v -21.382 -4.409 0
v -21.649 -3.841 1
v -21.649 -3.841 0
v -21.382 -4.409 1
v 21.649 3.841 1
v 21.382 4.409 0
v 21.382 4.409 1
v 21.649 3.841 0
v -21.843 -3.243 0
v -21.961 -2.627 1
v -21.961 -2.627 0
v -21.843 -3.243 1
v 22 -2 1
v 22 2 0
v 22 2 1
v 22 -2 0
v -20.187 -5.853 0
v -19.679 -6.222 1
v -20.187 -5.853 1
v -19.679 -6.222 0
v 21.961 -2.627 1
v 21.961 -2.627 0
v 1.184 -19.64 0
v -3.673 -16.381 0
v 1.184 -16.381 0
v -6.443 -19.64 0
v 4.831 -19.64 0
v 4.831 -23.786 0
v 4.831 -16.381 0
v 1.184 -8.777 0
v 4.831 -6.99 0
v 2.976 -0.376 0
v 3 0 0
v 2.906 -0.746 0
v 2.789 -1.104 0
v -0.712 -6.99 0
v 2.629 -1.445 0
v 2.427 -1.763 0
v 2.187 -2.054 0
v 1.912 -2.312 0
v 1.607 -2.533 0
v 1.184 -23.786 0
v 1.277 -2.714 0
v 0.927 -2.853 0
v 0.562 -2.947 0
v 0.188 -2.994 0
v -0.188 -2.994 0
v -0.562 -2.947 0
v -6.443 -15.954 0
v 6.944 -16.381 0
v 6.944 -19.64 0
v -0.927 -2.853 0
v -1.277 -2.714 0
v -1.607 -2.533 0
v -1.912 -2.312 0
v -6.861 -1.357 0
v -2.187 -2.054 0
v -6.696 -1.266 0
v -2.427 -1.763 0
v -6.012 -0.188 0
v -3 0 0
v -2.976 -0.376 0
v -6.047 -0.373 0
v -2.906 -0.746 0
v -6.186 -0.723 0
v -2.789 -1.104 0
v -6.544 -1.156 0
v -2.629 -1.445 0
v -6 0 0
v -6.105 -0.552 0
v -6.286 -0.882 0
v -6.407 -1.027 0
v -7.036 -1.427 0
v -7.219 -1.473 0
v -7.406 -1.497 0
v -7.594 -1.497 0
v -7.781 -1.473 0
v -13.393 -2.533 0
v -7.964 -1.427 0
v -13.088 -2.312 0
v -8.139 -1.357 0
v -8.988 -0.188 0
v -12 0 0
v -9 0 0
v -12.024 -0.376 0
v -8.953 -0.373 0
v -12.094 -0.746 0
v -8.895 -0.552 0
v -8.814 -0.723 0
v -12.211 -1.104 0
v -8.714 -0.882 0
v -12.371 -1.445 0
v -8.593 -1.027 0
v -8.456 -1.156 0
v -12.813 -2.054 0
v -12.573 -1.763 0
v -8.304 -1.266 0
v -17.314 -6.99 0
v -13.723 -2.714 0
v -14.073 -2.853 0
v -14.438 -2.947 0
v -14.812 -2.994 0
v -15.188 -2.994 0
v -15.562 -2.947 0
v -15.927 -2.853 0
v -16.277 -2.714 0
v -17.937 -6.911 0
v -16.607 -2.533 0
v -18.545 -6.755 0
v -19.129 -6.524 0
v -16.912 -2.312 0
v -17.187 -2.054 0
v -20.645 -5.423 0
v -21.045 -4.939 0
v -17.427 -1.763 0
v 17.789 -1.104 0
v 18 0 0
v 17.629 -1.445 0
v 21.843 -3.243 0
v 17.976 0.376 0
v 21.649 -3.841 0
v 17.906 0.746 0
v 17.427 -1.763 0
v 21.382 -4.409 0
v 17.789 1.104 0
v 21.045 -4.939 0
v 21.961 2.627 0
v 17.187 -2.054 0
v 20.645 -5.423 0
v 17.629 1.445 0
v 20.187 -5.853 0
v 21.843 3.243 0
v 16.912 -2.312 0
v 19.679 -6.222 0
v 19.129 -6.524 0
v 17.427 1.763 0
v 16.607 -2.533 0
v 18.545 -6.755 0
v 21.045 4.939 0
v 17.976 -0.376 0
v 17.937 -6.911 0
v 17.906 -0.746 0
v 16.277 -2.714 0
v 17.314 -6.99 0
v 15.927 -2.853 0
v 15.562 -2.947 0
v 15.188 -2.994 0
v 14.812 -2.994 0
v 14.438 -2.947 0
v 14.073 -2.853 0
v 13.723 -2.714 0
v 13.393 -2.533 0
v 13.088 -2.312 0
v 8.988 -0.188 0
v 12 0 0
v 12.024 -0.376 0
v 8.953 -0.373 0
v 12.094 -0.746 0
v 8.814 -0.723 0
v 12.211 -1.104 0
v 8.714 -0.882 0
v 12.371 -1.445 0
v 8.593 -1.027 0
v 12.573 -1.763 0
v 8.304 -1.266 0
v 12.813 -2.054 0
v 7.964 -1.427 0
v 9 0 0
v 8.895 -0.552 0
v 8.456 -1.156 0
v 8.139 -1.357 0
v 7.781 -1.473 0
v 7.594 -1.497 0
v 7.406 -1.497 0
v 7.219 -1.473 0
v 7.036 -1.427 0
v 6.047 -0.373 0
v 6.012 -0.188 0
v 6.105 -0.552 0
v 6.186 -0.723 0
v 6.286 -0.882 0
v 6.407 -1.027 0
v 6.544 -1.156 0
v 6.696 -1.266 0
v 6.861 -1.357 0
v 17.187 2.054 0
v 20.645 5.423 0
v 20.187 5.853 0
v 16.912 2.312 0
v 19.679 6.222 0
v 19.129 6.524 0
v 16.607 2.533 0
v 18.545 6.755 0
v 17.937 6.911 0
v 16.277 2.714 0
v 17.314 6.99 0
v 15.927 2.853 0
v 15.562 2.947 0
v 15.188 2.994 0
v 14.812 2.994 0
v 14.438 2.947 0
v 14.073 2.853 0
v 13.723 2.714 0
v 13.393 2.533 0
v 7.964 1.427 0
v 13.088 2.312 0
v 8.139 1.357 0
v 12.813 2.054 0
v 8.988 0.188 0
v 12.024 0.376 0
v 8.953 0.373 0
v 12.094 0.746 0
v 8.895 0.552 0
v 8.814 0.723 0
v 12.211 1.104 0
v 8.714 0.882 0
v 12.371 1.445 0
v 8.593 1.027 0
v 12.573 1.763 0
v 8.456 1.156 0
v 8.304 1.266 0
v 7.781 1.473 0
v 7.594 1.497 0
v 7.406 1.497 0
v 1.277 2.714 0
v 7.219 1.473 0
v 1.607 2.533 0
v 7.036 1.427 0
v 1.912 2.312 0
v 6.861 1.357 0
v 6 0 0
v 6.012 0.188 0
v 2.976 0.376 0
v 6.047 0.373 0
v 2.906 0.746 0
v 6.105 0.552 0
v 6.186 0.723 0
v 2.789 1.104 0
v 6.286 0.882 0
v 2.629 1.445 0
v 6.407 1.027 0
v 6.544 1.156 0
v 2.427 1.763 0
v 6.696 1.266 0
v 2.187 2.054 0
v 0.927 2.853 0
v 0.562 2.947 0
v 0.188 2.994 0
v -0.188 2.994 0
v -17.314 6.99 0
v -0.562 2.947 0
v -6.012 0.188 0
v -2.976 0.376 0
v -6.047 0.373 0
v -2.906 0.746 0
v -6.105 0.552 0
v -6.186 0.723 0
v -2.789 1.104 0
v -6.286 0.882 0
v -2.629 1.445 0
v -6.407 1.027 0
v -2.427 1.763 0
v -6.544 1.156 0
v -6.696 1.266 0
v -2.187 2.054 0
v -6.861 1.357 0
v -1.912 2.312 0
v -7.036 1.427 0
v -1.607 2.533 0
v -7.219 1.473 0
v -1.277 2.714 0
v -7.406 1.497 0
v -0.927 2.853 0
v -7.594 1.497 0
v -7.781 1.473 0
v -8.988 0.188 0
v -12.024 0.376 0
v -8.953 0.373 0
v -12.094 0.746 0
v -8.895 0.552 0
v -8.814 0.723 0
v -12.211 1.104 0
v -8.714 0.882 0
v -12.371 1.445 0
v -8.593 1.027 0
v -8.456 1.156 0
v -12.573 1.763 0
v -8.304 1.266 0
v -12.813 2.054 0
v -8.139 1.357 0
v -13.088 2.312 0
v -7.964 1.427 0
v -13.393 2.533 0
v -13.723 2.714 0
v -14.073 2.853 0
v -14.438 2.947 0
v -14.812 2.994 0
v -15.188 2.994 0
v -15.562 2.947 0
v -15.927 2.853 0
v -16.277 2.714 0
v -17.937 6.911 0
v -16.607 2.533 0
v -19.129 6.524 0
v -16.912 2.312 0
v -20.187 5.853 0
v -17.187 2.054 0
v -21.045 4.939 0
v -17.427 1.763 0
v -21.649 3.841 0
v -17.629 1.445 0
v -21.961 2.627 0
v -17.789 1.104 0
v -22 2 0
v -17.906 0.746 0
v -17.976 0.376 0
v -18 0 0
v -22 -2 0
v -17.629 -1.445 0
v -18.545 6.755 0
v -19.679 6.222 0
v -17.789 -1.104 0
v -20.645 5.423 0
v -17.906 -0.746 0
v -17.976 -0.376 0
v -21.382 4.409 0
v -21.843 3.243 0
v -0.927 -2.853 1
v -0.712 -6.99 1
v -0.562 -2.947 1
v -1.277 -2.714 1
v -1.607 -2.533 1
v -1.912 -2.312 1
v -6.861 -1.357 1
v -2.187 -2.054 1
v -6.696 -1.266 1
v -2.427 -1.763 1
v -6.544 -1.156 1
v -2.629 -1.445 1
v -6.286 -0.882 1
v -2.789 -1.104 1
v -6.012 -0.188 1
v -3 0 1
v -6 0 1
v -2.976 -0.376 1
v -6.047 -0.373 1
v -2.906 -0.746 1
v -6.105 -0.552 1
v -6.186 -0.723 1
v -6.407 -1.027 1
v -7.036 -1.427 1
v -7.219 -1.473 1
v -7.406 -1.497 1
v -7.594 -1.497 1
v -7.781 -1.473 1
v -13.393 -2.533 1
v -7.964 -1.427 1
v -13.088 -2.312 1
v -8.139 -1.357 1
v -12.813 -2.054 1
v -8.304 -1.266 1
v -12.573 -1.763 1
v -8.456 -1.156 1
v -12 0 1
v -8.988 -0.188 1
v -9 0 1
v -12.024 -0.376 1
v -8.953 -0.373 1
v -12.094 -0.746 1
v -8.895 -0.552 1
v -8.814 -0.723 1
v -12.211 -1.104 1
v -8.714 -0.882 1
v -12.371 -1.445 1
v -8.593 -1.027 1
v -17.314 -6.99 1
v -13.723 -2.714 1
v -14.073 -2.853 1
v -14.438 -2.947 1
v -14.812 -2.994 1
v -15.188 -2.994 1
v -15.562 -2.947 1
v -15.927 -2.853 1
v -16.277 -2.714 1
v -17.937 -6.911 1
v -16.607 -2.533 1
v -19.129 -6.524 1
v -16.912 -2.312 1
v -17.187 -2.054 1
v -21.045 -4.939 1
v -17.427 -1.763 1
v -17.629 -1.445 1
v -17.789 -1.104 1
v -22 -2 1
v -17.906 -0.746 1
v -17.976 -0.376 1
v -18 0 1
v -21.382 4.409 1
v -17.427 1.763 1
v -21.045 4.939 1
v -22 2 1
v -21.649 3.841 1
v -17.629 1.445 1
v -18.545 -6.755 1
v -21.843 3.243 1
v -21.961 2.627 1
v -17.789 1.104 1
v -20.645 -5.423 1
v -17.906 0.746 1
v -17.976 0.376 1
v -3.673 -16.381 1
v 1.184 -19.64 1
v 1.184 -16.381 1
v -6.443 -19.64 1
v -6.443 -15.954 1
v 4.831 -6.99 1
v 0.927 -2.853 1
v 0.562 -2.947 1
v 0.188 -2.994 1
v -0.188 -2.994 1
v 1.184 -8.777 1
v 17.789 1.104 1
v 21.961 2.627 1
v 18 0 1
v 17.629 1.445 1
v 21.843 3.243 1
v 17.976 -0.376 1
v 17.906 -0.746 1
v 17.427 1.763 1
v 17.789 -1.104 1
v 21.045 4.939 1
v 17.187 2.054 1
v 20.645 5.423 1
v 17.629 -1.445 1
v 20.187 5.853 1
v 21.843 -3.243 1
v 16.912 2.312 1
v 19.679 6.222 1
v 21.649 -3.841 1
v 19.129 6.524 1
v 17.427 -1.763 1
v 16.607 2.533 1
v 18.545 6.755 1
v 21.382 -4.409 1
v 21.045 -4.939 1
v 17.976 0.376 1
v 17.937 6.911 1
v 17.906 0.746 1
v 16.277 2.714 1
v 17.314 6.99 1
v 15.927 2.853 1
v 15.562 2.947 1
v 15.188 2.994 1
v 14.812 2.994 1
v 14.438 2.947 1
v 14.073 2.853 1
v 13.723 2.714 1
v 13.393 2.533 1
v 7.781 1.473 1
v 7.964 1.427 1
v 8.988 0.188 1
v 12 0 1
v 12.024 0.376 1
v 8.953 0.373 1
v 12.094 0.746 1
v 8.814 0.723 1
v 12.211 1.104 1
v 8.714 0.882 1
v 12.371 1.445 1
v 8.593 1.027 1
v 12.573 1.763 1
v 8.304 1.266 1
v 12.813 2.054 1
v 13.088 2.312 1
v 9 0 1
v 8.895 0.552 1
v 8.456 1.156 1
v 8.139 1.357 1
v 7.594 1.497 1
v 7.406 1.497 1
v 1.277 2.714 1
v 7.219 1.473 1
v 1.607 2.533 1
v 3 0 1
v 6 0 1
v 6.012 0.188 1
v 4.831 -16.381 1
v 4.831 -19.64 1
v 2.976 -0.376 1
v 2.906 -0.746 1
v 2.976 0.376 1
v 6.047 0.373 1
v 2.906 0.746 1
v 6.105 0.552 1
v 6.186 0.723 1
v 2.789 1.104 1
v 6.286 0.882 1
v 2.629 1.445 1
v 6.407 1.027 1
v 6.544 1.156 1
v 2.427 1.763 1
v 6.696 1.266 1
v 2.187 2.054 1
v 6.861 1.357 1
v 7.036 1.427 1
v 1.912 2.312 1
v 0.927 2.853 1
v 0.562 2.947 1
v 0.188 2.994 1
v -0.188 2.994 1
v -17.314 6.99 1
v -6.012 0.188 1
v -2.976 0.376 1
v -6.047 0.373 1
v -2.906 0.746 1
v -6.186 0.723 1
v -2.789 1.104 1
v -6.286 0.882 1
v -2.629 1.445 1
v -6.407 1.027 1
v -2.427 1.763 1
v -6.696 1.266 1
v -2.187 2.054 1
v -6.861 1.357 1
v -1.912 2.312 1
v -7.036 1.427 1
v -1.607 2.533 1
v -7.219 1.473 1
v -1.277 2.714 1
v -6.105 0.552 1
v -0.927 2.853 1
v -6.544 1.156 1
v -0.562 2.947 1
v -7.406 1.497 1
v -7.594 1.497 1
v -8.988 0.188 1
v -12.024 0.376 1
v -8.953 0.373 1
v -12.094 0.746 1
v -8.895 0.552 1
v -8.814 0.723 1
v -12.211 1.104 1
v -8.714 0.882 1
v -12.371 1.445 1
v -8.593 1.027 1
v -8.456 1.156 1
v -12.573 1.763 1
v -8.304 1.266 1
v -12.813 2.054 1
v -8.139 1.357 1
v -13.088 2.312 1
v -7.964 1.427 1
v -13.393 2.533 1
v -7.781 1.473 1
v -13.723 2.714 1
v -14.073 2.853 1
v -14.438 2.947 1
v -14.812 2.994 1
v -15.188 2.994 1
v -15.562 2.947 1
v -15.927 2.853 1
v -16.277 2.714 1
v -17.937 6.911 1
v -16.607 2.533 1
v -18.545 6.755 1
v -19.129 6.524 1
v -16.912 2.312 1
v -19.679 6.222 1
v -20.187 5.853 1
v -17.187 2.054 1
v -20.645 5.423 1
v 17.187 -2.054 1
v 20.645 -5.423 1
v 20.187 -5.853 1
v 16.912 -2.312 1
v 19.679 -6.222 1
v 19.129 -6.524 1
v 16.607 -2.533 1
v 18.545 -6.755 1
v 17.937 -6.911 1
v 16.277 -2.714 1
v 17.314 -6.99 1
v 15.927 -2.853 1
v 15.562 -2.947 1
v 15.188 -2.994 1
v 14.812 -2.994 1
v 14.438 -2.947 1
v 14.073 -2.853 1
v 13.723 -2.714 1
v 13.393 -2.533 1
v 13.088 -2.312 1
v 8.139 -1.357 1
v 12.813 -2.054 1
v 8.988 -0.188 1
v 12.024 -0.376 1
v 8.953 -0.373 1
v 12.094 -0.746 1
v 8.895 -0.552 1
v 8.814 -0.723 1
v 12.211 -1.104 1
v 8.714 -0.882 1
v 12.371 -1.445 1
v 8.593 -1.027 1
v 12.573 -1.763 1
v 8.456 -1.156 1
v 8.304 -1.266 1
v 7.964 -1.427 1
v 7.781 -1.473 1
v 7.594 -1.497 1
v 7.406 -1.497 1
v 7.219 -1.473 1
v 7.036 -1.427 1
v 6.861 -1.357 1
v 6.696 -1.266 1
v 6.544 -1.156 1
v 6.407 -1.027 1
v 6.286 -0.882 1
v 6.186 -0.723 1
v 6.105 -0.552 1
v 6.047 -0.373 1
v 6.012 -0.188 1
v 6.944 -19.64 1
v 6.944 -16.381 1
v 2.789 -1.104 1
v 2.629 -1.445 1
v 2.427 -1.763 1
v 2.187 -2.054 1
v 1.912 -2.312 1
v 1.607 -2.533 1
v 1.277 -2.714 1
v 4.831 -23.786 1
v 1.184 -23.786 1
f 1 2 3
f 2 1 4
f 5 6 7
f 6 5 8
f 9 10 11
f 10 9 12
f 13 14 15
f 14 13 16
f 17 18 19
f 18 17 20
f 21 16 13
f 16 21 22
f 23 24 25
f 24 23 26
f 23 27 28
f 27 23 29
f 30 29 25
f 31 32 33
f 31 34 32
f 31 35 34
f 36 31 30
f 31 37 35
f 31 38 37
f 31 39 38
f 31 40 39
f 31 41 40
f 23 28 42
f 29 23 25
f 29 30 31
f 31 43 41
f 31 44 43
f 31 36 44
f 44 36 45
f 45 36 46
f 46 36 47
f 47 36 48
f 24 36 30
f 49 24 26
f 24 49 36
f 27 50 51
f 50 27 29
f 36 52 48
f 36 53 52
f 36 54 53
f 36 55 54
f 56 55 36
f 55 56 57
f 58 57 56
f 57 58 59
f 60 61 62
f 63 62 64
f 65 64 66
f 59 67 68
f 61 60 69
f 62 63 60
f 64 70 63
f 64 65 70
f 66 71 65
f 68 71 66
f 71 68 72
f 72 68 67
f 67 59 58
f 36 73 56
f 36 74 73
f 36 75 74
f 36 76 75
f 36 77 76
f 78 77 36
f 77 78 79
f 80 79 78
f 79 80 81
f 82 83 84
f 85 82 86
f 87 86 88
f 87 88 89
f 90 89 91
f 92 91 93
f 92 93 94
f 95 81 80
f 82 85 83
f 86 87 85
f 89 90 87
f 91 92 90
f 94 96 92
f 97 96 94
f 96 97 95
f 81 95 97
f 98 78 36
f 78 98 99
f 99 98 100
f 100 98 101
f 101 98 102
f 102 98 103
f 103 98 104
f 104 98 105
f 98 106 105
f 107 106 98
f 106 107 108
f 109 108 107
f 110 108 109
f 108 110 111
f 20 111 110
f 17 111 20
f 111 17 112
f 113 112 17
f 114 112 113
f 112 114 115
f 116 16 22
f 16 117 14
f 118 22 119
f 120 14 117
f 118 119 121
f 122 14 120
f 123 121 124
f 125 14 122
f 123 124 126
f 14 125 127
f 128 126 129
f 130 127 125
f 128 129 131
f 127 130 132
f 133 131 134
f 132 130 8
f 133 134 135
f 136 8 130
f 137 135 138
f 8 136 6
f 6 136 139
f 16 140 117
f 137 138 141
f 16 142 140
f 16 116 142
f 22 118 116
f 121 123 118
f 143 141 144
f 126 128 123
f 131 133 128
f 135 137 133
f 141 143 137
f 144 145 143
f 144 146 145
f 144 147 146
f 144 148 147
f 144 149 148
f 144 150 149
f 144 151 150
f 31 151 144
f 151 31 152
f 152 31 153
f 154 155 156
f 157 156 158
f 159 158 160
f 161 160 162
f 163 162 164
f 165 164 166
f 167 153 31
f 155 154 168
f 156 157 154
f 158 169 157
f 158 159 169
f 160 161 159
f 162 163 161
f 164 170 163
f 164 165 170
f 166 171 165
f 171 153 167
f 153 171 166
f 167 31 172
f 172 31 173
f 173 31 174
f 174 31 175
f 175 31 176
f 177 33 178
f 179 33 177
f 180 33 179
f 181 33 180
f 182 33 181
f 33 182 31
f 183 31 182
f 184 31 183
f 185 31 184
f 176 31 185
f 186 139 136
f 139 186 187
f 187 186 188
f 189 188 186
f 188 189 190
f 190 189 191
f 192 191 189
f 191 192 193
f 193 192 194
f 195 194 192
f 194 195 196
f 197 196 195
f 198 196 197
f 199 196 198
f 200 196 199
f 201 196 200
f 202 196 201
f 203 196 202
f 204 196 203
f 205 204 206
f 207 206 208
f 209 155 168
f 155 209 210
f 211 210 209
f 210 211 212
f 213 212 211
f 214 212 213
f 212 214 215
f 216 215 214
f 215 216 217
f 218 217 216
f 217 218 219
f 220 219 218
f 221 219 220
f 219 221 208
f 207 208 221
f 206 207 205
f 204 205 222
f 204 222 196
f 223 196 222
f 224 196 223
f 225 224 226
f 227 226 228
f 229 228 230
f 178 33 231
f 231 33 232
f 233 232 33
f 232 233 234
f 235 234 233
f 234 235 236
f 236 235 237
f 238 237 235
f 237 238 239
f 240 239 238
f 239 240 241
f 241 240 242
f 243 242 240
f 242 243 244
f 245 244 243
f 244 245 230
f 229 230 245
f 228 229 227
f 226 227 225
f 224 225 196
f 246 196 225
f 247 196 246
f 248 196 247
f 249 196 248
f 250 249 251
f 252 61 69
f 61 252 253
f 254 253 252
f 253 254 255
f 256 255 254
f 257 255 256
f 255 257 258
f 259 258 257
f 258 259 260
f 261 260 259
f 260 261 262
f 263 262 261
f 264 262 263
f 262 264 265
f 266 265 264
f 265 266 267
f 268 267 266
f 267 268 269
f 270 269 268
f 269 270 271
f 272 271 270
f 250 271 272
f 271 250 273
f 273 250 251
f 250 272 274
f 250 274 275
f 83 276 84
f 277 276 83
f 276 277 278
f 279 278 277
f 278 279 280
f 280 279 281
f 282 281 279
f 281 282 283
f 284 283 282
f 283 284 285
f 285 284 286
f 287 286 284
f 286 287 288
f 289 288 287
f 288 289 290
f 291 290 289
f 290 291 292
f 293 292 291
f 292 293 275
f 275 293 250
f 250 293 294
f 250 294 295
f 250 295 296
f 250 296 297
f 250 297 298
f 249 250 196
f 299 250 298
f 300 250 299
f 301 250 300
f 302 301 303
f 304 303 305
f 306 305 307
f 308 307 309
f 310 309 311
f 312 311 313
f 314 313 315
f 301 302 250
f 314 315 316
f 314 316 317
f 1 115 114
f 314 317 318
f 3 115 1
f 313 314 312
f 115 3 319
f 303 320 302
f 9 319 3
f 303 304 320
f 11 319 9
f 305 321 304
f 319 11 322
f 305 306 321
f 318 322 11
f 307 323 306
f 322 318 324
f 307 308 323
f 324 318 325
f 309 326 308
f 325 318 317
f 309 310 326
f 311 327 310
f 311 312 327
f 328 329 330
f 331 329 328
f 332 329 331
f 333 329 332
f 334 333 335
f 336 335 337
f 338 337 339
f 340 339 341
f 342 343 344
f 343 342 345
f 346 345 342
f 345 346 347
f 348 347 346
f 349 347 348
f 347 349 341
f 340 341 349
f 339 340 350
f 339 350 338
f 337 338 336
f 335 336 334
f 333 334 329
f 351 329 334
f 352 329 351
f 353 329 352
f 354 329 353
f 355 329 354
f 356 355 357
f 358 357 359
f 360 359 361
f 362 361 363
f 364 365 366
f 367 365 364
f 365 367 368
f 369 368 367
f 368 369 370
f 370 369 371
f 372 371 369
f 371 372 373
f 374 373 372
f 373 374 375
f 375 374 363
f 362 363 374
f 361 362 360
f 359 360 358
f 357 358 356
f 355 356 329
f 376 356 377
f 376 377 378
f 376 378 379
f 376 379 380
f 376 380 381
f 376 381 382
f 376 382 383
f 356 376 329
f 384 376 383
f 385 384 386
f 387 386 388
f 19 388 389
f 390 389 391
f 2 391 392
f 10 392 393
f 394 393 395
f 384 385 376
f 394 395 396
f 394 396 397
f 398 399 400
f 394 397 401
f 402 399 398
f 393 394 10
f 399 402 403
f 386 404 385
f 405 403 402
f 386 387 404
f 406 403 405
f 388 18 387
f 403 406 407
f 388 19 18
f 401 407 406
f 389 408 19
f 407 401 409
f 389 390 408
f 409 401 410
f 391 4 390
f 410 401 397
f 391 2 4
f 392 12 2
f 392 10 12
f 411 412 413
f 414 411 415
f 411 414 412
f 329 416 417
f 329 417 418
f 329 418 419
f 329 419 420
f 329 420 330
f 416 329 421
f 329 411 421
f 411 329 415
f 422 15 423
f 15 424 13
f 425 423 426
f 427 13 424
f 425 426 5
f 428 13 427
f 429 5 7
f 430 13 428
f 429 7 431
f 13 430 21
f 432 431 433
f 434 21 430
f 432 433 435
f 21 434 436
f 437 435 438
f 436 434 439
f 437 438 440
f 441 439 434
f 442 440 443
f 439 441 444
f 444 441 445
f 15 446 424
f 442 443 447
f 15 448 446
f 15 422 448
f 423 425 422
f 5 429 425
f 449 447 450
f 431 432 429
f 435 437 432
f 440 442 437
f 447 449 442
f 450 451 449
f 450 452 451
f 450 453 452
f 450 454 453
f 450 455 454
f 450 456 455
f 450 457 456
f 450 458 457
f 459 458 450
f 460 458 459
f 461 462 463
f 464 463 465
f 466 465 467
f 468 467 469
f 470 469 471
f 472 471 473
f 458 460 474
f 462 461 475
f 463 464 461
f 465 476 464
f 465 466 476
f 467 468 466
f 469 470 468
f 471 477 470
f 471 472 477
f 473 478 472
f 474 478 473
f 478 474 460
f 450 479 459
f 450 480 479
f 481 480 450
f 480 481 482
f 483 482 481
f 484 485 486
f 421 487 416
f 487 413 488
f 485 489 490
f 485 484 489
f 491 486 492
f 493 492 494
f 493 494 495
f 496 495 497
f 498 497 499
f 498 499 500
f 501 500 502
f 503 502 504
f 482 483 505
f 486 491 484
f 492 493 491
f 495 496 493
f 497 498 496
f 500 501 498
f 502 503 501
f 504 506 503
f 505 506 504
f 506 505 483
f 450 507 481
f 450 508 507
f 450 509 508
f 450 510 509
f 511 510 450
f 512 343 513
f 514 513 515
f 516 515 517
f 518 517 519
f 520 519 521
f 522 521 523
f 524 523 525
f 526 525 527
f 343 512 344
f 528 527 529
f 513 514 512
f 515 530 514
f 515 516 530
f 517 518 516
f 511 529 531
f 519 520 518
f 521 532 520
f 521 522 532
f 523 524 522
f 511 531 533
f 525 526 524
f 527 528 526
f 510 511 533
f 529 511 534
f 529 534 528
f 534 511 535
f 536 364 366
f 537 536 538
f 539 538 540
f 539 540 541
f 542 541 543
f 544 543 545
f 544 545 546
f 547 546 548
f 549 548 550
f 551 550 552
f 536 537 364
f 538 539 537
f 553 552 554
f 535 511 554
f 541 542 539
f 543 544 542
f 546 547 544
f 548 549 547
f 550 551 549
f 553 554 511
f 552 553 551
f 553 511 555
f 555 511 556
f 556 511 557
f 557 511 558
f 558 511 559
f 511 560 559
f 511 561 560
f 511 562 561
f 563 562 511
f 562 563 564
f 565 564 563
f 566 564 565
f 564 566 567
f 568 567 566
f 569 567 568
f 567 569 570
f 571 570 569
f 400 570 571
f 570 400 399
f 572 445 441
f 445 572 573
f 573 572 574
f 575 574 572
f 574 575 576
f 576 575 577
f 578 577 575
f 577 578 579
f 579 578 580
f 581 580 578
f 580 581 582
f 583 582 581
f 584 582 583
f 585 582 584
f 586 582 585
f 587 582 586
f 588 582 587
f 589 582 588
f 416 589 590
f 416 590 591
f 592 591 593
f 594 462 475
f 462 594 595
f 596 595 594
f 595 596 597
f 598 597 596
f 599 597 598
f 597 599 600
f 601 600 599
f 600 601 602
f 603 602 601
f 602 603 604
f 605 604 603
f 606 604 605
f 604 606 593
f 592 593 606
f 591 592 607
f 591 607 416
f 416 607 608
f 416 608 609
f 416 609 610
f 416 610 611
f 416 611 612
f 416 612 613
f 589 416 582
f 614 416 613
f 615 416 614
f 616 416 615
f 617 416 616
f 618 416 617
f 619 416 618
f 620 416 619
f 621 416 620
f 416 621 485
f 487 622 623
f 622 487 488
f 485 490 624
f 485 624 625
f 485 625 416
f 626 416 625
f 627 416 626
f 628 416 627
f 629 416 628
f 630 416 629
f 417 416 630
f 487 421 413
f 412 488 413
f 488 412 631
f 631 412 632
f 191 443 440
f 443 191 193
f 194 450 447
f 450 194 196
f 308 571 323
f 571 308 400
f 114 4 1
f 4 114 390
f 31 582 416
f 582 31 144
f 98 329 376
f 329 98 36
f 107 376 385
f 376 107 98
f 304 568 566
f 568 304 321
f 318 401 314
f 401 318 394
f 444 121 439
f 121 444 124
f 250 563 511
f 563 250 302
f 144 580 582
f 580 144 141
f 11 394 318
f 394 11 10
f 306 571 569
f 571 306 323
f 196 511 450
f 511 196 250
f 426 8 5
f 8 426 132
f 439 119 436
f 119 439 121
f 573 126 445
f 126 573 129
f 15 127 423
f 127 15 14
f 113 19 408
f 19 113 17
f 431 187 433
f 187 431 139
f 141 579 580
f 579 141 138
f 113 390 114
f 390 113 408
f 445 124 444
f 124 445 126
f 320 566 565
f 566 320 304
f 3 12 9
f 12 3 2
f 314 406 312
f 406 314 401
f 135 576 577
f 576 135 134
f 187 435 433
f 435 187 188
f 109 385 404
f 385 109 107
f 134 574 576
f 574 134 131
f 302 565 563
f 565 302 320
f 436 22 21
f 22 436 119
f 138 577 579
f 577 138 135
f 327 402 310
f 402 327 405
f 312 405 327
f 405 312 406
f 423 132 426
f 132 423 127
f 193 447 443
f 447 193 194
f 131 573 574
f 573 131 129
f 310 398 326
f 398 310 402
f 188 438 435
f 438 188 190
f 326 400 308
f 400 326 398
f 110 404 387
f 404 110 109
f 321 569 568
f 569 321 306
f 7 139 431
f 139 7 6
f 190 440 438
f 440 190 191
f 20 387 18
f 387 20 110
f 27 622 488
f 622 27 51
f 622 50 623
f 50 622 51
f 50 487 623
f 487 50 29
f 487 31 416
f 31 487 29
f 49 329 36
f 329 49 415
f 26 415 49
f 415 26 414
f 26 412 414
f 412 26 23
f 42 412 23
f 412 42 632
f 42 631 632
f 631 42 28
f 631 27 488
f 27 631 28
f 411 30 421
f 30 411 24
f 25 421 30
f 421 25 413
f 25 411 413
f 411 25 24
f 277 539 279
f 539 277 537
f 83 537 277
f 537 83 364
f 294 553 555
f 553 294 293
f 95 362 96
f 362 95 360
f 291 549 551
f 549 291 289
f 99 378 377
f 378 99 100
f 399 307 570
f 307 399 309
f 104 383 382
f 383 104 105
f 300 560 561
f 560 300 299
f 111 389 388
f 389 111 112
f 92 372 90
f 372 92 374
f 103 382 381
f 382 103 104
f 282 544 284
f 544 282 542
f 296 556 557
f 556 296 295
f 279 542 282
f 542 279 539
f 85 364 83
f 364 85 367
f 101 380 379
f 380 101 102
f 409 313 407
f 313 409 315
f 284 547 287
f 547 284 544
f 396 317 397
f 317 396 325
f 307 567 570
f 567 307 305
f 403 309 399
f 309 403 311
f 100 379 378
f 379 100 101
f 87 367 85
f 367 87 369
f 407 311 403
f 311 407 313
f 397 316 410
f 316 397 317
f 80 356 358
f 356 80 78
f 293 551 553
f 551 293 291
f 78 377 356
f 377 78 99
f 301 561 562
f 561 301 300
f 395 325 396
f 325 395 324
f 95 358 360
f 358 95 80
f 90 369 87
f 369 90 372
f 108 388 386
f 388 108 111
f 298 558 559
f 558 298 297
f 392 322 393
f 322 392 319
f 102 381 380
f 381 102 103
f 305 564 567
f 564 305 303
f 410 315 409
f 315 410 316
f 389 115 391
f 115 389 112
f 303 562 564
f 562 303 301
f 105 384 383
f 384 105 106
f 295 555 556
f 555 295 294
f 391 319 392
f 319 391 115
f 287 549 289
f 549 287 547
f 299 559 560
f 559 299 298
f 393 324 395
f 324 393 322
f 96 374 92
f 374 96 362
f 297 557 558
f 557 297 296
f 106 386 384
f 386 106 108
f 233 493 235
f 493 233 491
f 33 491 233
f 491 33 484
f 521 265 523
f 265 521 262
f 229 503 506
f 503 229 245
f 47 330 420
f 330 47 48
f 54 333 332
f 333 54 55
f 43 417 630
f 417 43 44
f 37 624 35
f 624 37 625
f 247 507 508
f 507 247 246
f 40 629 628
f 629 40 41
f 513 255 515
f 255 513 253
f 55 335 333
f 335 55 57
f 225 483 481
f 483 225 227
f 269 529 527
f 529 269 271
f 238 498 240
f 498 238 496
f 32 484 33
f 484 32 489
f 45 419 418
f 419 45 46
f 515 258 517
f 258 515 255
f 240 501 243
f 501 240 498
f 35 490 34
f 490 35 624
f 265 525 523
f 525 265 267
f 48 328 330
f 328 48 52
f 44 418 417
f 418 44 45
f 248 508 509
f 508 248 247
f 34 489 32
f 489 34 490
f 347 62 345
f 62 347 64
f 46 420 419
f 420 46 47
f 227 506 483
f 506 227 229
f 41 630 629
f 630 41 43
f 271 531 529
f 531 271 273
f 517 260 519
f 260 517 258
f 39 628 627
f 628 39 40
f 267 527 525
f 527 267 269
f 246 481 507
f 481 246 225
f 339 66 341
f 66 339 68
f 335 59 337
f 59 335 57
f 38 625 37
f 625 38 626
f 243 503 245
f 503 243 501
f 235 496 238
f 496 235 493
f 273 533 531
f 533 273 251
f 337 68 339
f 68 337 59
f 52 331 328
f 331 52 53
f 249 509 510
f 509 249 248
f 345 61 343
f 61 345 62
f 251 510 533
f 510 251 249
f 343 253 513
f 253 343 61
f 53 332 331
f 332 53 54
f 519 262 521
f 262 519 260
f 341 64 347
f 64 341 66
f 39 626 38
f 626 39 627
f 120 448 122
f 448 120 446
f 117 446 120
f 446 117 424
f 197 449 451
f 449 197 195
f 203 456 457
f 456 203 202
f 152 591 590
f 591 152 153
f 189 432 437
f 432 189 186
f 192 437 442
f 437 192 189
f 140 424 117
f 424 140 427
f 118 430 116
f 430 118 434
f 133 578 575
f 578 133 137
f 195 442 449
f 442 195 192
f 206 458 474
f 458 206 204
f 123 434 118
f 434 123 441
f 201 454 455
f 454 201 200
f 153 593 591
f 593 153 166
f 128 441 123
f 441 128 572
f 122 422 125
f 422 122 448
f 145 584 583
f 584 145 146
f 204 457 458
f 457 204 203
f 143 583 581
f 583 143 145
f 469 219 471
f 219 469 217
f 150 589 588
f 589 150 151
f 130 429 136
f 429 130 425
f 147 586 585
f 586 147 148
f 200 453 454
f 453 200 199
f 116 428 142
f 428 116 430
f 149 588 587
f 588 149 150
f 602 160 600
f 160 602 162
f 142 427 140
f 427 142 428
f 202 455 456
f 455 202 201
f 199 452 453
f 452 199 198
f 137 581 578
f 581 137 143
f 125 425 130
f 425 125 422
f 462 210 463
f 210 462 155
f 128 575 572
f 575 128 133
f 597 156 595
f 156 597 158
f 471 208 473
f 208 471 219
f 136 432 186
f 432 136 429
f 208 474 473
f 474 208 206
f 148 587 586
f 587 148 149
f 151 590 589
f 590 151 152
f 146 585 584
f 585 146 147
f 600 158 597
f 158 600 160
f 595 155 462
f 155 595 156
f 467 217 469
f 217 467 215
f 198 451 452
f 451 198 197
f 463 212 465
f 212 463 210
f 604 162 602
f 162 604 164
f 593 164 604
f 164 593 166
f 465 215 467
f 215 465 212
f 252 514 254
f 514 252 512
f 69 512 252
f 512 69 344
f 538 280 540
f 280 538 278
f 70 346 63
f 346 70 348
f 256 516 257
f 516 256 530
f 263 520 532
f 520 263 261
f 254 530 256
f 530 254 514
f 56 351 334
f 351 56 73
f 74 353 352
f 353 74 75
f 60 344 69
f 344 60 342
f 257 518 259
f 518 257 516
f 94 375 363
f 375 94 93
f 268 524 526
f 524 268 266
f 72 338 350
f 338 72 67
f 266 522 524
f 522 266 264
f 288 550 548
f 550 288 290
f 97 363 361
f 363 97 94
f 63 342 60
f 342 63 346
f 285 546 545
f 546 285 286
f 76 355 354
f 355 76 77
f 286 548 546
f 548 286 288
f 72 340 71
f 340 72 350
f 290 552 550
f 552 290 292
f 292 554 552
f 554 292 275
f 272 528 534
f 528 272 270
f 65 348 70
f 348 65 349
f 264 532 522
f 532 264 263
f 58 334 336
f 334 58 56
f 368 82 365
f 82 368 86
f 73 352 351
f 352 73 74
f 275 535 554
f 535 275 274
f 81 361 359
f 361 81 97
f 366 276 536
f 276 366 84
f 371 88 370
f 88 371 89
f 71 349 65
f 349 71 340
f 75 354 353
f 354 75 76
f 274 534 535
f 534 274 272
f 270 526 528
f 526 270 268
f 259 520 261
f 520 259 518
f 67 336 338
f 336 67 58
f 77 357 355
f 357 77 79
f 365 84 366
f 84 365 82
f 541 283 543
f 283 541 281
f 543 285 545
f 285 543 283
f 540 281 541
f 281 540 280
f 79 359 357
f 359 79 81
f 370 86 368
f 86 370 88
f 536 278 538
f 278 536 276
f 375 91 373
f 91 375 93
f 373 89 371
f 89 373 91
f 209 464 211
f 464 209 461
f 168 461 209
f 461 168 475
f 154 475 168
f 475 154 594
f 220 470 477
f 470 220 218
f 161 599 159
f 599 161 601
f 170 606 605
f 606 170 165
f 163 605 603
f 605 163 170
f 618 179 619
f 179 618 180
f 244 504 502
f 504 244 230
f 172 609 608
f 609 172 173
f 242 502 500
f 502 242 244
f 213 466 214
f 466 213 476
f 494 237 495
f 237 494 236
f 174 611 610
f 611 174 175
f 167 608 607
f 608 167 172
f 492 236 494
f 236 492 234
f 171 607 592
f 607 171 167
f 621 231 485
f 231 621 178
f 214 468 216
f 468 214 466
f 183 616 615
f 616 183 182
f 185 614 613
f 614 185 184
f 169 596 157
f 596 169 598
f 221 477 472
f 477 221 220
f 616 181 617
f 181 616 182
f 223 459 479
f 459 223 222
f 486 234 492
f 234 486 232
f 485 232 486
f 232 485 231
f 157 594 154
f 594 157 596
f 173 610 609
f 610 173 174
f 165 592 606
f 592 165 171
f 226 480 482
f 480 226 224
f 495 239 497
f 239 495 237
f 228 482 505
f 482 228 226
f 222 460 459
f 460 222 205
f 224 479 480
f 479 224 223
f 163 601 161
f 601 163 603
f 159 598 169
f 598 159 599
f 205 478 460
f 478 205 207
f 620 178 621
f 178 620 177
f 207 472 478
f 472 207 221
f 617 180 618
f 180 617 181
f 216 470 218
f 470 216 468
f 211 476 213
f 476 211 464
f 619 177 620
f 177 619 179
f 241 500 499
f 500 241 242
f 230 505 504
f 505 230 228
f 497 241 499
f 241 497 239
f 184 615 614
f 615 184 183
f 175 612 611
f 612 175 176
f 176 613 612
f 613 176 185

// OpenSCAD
$fn = 50;


difference() {
	union() {
		hull() {
			translate(v = [-17.0000000000, 2.0000000000, 0]) {
				cylinder(h = 1, r = 5);
			}
			translate(v = [17.0000000000, 2.0000000000, 0]) {
				cylinder(h = 1, r = 5);
			}
			translate(v = [-17.0000000000, -2.0000000000, 0]) {
				cylinder(h = 1, r = 5);
			}
			translate(v = [17.0000000000, -2.0000000000, 0]) {
				cylinder(h = 1, r = 5);
			}
		}
		translate(v = [0, -5, 0]) {
			linear_extrude(height = 1) {
				text(font = "DejaVu Sans Mono:style=Bold", halign = "center", size = 19.0000000000, text = "4", valign = "top");
			}
		}
	}
	union() {
		translate(v = [-15.0000000000, 0.0000000000, 0]) {
			translate(v = [0, 0, -100]) {
				cylinder(h = 200, r = 3.0000000000);
			}
		}
		translate(v = [0, 0, -100]) {
			cylinder(h = 200, r = 3.0000000000);
		}
		translate(v = [15.0000000000, 0.0000000000, 0]) {
			translate(v = [0, 0, -100]) {
				cylinder(h = 200, r = 3.0000000000);
			}
		}
		translate(v = [-15.0000000000, 0.0000000000, 0]) {
			translate(v = [0, 0, -100]) {
				cylinder(h = 200, r = 1.5000000000);
			}
		}
		translate(v = [-7.5000000000, 0.0000000000, 0]) {
			translate(v = [0, 0, -100]) {
				cylinder(h = 200, r = 1.5000000000);
			}
		}
		translate(v = [0, 0, -100]) {
			cylinder(h = 200, r = 1.5000000000);
		}
		translate(v = [7.5000000000, 0.0000000000, 0]) {
			translate(v = [0, 0, -100]) {
				cylinder(h = 200, r = 1.5000000000);
			}
		}
		translate(v = [15.0000000000, 0.0000000000, 0]) {
			translate(v = [0, 0, -100]) {
				cylinder(h = 200, r = 1.5000000000);
			}
		}
	}
}
